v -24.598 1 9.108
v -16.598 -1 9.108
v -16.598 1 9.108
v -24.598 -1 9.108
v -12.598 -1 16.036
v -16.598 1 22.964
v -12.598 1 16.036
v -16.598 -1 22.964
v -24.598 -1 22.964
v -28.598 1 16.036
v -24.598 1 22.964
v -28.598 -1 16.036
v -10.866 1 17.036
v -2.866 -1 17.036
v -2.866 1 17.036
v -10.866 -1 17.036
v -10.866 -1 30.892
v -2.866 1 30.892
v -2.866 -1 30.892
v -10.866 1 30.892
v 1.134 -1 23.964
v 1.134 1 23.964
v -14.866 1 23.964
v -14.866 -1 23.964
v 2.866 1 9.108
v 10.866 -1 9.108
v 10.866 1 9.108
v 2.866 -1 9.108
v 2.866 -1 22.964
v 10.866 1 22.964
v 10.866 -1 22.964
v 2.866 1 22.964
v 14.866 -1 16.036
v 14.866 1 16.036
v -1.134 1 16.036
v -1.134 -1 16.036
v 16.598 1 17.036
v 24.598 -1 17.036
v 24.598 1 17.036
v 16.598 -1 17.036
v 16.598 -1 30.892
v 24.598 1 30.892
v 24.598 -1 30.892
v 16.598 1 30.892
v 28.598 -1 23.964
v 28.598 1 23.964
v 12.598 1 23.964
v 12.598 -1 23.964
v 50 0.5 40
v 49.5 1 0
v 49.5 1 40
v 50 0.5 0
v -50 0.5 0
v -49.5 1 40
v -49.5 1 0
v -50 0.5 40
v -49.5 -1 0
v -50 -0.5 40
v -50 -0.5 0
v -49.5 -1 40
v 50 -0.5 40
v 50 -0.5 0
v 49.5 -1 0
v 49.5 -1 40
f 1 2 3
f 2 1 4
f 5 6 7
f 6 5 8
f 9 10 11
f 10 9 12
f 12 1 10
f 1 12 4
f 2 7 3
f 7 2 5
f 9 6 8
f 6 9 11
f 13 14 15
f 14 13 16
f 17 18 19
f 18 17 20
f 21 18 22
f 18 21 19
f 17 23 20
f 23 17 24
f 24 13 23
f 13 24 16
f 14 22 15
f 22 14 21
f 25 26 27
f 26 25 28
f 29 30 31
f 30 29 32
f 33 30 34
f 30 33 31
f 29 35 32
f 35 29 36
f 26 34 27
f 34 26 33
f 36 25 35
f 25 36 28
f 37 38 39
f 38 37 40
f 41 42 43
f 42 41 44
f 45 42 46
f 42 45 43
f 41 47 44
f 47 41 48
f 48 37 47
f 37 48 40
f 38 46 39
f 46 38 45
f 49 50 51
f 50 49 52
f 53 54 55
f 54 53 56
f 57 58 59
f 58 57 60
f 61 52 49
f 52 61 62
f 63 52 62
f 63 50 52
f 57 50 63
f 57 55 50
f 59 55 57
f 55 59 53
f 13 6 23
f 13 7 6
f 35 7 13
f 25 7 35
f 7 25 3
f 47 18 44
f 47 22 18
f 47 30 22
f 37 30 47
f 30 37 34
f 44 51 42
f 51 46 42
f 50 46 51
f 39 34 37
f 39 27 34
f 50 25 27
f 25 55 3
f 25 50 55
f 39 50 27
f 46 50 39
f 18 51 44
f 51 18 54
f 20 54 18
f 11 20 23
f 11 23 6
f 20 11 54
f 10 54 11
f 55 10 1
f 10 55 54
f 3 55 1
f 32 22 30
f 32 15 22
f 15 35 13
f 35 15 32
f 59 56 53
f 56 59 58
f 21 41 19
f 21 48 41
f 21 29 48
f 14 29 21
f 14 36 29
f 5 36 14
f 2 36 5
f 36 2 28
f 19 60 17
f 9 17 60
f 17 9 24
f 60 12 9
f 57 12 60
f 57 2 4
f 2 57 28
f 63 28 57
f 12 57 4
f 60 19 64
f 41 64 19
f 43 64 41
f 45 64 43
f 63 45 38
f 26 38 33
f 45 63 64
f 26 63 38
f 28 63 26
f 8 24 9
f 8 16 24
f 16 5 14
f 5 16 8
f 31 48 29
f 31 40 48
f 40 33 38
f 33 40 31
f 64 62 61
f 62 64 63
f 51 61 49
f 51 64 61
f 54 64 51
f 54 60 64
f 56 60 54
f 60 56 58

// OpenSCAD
// The Drawer Dividers V3 – Wall
// Divider walls with optional hex/circle pattern and finger grip.
use <lib/drawer_divider.scad>

/* [Part] */
// Wall length (mm) – the designer tells you which lengths you need
Length = 100; // [20:0.1:400]
// Wall height (mm, 0 = automatic from the connector height)
Wall_Height = 0; // [0:0.1:150]
// Is this wall used with slip-on connectors? (lowers it by the floor thickness)
For_Slip_On = false;
// How many copies on the plate
Count = 1; // [1:1:40]
// Gap between copies (mm)
Spacing = 5; // [2:1:20]
// Print orientation
Orientation = "standing"; // [standing:Standing (strong, fast), flat:Flat (best with patterns)]

/* [Style] */
// Material-saving pattern
Pattern = "hex"; // [none:None, hex:Honeycomb, circle:Circles]
// Size of one cell (radius, mm)
Cell_Size = 8; // [2:0.5:30]
// Web between two cells (mm)
Web = 2; // [0.5:0.1:10]
// Solid border at both ends (mm, -1 = automatic: insert depth + 2)
Margin_Side = -1; // [-1:1:60]
// Solid border at top and bottom (mm)
Margin_Top_Bottom = 5; // [2:0.5:20]
// Chamfer on the short ends for easy insertion (mm)
End_Chamfer = 0.5; // [0:0.1:2]
// Finger grip at the top centre (radius in mm, 0 = off)
Grip = 0; // [0:0.5:20]

/* [System] */
// Exact thickness of your printed walls (mm)
Wall_Thickness = 2.0; // [0.8:0.1:10]
// Extra slot width so the wall does not bind (mm, 0.2 fits most printers)
Tolerance = 0.2; // [0:0.01:1]
// Height of the connectors (mm)
Height = 40; // [10:1:150]
// How deep the wall slides into an arm (mm)
Insert_Depth = 14; // [5:1:30]
// Closed cap on one end (mm, 0 = open on both ends)
Cap_Thickness = 0; // [0:0.5:10]
// Cap thickness of the slip-on connectors (mm)
Floor_Thickness = 2; // [0.5:0.1:5]
// Gap between wall top and cap (mm)
Top_Gap = 0.2; // [0:0.05:1]

/* [Hidden] */
$fn = 32;

P = dd_profile(
    wall_t = Wall_Thickness, tol = Tolerance, height = Height,
    insert = Insert_Depth, cap = Cap_Thickness, floor_t = Floor_Thickness,
    top_gap = Top_Gap);

h = Wall_Height > 0 ? Wall_Height : dd_wall_height(P, For_Slip_On);
t = dd(P, "wall_t");

module one_wall()
    dd_wall(Length, P, height = h, pattern = Pattern, cell = Cell_Size,
            web = Web, margin_side = Margin_Side, margin_tb = Margin_Top_Bottom,
            end_chamfer = End_Chamfer, grip = Grip);

if (Orientation == "flat")
    dd_grid(Count, Length + Spacing, h + Spacing) translate([0, h / 2, 0]) dd_lay_flat(t) one_wall();
else
    dd_grid(Count, Length + Spacing, t + Spacing) one_wall();
